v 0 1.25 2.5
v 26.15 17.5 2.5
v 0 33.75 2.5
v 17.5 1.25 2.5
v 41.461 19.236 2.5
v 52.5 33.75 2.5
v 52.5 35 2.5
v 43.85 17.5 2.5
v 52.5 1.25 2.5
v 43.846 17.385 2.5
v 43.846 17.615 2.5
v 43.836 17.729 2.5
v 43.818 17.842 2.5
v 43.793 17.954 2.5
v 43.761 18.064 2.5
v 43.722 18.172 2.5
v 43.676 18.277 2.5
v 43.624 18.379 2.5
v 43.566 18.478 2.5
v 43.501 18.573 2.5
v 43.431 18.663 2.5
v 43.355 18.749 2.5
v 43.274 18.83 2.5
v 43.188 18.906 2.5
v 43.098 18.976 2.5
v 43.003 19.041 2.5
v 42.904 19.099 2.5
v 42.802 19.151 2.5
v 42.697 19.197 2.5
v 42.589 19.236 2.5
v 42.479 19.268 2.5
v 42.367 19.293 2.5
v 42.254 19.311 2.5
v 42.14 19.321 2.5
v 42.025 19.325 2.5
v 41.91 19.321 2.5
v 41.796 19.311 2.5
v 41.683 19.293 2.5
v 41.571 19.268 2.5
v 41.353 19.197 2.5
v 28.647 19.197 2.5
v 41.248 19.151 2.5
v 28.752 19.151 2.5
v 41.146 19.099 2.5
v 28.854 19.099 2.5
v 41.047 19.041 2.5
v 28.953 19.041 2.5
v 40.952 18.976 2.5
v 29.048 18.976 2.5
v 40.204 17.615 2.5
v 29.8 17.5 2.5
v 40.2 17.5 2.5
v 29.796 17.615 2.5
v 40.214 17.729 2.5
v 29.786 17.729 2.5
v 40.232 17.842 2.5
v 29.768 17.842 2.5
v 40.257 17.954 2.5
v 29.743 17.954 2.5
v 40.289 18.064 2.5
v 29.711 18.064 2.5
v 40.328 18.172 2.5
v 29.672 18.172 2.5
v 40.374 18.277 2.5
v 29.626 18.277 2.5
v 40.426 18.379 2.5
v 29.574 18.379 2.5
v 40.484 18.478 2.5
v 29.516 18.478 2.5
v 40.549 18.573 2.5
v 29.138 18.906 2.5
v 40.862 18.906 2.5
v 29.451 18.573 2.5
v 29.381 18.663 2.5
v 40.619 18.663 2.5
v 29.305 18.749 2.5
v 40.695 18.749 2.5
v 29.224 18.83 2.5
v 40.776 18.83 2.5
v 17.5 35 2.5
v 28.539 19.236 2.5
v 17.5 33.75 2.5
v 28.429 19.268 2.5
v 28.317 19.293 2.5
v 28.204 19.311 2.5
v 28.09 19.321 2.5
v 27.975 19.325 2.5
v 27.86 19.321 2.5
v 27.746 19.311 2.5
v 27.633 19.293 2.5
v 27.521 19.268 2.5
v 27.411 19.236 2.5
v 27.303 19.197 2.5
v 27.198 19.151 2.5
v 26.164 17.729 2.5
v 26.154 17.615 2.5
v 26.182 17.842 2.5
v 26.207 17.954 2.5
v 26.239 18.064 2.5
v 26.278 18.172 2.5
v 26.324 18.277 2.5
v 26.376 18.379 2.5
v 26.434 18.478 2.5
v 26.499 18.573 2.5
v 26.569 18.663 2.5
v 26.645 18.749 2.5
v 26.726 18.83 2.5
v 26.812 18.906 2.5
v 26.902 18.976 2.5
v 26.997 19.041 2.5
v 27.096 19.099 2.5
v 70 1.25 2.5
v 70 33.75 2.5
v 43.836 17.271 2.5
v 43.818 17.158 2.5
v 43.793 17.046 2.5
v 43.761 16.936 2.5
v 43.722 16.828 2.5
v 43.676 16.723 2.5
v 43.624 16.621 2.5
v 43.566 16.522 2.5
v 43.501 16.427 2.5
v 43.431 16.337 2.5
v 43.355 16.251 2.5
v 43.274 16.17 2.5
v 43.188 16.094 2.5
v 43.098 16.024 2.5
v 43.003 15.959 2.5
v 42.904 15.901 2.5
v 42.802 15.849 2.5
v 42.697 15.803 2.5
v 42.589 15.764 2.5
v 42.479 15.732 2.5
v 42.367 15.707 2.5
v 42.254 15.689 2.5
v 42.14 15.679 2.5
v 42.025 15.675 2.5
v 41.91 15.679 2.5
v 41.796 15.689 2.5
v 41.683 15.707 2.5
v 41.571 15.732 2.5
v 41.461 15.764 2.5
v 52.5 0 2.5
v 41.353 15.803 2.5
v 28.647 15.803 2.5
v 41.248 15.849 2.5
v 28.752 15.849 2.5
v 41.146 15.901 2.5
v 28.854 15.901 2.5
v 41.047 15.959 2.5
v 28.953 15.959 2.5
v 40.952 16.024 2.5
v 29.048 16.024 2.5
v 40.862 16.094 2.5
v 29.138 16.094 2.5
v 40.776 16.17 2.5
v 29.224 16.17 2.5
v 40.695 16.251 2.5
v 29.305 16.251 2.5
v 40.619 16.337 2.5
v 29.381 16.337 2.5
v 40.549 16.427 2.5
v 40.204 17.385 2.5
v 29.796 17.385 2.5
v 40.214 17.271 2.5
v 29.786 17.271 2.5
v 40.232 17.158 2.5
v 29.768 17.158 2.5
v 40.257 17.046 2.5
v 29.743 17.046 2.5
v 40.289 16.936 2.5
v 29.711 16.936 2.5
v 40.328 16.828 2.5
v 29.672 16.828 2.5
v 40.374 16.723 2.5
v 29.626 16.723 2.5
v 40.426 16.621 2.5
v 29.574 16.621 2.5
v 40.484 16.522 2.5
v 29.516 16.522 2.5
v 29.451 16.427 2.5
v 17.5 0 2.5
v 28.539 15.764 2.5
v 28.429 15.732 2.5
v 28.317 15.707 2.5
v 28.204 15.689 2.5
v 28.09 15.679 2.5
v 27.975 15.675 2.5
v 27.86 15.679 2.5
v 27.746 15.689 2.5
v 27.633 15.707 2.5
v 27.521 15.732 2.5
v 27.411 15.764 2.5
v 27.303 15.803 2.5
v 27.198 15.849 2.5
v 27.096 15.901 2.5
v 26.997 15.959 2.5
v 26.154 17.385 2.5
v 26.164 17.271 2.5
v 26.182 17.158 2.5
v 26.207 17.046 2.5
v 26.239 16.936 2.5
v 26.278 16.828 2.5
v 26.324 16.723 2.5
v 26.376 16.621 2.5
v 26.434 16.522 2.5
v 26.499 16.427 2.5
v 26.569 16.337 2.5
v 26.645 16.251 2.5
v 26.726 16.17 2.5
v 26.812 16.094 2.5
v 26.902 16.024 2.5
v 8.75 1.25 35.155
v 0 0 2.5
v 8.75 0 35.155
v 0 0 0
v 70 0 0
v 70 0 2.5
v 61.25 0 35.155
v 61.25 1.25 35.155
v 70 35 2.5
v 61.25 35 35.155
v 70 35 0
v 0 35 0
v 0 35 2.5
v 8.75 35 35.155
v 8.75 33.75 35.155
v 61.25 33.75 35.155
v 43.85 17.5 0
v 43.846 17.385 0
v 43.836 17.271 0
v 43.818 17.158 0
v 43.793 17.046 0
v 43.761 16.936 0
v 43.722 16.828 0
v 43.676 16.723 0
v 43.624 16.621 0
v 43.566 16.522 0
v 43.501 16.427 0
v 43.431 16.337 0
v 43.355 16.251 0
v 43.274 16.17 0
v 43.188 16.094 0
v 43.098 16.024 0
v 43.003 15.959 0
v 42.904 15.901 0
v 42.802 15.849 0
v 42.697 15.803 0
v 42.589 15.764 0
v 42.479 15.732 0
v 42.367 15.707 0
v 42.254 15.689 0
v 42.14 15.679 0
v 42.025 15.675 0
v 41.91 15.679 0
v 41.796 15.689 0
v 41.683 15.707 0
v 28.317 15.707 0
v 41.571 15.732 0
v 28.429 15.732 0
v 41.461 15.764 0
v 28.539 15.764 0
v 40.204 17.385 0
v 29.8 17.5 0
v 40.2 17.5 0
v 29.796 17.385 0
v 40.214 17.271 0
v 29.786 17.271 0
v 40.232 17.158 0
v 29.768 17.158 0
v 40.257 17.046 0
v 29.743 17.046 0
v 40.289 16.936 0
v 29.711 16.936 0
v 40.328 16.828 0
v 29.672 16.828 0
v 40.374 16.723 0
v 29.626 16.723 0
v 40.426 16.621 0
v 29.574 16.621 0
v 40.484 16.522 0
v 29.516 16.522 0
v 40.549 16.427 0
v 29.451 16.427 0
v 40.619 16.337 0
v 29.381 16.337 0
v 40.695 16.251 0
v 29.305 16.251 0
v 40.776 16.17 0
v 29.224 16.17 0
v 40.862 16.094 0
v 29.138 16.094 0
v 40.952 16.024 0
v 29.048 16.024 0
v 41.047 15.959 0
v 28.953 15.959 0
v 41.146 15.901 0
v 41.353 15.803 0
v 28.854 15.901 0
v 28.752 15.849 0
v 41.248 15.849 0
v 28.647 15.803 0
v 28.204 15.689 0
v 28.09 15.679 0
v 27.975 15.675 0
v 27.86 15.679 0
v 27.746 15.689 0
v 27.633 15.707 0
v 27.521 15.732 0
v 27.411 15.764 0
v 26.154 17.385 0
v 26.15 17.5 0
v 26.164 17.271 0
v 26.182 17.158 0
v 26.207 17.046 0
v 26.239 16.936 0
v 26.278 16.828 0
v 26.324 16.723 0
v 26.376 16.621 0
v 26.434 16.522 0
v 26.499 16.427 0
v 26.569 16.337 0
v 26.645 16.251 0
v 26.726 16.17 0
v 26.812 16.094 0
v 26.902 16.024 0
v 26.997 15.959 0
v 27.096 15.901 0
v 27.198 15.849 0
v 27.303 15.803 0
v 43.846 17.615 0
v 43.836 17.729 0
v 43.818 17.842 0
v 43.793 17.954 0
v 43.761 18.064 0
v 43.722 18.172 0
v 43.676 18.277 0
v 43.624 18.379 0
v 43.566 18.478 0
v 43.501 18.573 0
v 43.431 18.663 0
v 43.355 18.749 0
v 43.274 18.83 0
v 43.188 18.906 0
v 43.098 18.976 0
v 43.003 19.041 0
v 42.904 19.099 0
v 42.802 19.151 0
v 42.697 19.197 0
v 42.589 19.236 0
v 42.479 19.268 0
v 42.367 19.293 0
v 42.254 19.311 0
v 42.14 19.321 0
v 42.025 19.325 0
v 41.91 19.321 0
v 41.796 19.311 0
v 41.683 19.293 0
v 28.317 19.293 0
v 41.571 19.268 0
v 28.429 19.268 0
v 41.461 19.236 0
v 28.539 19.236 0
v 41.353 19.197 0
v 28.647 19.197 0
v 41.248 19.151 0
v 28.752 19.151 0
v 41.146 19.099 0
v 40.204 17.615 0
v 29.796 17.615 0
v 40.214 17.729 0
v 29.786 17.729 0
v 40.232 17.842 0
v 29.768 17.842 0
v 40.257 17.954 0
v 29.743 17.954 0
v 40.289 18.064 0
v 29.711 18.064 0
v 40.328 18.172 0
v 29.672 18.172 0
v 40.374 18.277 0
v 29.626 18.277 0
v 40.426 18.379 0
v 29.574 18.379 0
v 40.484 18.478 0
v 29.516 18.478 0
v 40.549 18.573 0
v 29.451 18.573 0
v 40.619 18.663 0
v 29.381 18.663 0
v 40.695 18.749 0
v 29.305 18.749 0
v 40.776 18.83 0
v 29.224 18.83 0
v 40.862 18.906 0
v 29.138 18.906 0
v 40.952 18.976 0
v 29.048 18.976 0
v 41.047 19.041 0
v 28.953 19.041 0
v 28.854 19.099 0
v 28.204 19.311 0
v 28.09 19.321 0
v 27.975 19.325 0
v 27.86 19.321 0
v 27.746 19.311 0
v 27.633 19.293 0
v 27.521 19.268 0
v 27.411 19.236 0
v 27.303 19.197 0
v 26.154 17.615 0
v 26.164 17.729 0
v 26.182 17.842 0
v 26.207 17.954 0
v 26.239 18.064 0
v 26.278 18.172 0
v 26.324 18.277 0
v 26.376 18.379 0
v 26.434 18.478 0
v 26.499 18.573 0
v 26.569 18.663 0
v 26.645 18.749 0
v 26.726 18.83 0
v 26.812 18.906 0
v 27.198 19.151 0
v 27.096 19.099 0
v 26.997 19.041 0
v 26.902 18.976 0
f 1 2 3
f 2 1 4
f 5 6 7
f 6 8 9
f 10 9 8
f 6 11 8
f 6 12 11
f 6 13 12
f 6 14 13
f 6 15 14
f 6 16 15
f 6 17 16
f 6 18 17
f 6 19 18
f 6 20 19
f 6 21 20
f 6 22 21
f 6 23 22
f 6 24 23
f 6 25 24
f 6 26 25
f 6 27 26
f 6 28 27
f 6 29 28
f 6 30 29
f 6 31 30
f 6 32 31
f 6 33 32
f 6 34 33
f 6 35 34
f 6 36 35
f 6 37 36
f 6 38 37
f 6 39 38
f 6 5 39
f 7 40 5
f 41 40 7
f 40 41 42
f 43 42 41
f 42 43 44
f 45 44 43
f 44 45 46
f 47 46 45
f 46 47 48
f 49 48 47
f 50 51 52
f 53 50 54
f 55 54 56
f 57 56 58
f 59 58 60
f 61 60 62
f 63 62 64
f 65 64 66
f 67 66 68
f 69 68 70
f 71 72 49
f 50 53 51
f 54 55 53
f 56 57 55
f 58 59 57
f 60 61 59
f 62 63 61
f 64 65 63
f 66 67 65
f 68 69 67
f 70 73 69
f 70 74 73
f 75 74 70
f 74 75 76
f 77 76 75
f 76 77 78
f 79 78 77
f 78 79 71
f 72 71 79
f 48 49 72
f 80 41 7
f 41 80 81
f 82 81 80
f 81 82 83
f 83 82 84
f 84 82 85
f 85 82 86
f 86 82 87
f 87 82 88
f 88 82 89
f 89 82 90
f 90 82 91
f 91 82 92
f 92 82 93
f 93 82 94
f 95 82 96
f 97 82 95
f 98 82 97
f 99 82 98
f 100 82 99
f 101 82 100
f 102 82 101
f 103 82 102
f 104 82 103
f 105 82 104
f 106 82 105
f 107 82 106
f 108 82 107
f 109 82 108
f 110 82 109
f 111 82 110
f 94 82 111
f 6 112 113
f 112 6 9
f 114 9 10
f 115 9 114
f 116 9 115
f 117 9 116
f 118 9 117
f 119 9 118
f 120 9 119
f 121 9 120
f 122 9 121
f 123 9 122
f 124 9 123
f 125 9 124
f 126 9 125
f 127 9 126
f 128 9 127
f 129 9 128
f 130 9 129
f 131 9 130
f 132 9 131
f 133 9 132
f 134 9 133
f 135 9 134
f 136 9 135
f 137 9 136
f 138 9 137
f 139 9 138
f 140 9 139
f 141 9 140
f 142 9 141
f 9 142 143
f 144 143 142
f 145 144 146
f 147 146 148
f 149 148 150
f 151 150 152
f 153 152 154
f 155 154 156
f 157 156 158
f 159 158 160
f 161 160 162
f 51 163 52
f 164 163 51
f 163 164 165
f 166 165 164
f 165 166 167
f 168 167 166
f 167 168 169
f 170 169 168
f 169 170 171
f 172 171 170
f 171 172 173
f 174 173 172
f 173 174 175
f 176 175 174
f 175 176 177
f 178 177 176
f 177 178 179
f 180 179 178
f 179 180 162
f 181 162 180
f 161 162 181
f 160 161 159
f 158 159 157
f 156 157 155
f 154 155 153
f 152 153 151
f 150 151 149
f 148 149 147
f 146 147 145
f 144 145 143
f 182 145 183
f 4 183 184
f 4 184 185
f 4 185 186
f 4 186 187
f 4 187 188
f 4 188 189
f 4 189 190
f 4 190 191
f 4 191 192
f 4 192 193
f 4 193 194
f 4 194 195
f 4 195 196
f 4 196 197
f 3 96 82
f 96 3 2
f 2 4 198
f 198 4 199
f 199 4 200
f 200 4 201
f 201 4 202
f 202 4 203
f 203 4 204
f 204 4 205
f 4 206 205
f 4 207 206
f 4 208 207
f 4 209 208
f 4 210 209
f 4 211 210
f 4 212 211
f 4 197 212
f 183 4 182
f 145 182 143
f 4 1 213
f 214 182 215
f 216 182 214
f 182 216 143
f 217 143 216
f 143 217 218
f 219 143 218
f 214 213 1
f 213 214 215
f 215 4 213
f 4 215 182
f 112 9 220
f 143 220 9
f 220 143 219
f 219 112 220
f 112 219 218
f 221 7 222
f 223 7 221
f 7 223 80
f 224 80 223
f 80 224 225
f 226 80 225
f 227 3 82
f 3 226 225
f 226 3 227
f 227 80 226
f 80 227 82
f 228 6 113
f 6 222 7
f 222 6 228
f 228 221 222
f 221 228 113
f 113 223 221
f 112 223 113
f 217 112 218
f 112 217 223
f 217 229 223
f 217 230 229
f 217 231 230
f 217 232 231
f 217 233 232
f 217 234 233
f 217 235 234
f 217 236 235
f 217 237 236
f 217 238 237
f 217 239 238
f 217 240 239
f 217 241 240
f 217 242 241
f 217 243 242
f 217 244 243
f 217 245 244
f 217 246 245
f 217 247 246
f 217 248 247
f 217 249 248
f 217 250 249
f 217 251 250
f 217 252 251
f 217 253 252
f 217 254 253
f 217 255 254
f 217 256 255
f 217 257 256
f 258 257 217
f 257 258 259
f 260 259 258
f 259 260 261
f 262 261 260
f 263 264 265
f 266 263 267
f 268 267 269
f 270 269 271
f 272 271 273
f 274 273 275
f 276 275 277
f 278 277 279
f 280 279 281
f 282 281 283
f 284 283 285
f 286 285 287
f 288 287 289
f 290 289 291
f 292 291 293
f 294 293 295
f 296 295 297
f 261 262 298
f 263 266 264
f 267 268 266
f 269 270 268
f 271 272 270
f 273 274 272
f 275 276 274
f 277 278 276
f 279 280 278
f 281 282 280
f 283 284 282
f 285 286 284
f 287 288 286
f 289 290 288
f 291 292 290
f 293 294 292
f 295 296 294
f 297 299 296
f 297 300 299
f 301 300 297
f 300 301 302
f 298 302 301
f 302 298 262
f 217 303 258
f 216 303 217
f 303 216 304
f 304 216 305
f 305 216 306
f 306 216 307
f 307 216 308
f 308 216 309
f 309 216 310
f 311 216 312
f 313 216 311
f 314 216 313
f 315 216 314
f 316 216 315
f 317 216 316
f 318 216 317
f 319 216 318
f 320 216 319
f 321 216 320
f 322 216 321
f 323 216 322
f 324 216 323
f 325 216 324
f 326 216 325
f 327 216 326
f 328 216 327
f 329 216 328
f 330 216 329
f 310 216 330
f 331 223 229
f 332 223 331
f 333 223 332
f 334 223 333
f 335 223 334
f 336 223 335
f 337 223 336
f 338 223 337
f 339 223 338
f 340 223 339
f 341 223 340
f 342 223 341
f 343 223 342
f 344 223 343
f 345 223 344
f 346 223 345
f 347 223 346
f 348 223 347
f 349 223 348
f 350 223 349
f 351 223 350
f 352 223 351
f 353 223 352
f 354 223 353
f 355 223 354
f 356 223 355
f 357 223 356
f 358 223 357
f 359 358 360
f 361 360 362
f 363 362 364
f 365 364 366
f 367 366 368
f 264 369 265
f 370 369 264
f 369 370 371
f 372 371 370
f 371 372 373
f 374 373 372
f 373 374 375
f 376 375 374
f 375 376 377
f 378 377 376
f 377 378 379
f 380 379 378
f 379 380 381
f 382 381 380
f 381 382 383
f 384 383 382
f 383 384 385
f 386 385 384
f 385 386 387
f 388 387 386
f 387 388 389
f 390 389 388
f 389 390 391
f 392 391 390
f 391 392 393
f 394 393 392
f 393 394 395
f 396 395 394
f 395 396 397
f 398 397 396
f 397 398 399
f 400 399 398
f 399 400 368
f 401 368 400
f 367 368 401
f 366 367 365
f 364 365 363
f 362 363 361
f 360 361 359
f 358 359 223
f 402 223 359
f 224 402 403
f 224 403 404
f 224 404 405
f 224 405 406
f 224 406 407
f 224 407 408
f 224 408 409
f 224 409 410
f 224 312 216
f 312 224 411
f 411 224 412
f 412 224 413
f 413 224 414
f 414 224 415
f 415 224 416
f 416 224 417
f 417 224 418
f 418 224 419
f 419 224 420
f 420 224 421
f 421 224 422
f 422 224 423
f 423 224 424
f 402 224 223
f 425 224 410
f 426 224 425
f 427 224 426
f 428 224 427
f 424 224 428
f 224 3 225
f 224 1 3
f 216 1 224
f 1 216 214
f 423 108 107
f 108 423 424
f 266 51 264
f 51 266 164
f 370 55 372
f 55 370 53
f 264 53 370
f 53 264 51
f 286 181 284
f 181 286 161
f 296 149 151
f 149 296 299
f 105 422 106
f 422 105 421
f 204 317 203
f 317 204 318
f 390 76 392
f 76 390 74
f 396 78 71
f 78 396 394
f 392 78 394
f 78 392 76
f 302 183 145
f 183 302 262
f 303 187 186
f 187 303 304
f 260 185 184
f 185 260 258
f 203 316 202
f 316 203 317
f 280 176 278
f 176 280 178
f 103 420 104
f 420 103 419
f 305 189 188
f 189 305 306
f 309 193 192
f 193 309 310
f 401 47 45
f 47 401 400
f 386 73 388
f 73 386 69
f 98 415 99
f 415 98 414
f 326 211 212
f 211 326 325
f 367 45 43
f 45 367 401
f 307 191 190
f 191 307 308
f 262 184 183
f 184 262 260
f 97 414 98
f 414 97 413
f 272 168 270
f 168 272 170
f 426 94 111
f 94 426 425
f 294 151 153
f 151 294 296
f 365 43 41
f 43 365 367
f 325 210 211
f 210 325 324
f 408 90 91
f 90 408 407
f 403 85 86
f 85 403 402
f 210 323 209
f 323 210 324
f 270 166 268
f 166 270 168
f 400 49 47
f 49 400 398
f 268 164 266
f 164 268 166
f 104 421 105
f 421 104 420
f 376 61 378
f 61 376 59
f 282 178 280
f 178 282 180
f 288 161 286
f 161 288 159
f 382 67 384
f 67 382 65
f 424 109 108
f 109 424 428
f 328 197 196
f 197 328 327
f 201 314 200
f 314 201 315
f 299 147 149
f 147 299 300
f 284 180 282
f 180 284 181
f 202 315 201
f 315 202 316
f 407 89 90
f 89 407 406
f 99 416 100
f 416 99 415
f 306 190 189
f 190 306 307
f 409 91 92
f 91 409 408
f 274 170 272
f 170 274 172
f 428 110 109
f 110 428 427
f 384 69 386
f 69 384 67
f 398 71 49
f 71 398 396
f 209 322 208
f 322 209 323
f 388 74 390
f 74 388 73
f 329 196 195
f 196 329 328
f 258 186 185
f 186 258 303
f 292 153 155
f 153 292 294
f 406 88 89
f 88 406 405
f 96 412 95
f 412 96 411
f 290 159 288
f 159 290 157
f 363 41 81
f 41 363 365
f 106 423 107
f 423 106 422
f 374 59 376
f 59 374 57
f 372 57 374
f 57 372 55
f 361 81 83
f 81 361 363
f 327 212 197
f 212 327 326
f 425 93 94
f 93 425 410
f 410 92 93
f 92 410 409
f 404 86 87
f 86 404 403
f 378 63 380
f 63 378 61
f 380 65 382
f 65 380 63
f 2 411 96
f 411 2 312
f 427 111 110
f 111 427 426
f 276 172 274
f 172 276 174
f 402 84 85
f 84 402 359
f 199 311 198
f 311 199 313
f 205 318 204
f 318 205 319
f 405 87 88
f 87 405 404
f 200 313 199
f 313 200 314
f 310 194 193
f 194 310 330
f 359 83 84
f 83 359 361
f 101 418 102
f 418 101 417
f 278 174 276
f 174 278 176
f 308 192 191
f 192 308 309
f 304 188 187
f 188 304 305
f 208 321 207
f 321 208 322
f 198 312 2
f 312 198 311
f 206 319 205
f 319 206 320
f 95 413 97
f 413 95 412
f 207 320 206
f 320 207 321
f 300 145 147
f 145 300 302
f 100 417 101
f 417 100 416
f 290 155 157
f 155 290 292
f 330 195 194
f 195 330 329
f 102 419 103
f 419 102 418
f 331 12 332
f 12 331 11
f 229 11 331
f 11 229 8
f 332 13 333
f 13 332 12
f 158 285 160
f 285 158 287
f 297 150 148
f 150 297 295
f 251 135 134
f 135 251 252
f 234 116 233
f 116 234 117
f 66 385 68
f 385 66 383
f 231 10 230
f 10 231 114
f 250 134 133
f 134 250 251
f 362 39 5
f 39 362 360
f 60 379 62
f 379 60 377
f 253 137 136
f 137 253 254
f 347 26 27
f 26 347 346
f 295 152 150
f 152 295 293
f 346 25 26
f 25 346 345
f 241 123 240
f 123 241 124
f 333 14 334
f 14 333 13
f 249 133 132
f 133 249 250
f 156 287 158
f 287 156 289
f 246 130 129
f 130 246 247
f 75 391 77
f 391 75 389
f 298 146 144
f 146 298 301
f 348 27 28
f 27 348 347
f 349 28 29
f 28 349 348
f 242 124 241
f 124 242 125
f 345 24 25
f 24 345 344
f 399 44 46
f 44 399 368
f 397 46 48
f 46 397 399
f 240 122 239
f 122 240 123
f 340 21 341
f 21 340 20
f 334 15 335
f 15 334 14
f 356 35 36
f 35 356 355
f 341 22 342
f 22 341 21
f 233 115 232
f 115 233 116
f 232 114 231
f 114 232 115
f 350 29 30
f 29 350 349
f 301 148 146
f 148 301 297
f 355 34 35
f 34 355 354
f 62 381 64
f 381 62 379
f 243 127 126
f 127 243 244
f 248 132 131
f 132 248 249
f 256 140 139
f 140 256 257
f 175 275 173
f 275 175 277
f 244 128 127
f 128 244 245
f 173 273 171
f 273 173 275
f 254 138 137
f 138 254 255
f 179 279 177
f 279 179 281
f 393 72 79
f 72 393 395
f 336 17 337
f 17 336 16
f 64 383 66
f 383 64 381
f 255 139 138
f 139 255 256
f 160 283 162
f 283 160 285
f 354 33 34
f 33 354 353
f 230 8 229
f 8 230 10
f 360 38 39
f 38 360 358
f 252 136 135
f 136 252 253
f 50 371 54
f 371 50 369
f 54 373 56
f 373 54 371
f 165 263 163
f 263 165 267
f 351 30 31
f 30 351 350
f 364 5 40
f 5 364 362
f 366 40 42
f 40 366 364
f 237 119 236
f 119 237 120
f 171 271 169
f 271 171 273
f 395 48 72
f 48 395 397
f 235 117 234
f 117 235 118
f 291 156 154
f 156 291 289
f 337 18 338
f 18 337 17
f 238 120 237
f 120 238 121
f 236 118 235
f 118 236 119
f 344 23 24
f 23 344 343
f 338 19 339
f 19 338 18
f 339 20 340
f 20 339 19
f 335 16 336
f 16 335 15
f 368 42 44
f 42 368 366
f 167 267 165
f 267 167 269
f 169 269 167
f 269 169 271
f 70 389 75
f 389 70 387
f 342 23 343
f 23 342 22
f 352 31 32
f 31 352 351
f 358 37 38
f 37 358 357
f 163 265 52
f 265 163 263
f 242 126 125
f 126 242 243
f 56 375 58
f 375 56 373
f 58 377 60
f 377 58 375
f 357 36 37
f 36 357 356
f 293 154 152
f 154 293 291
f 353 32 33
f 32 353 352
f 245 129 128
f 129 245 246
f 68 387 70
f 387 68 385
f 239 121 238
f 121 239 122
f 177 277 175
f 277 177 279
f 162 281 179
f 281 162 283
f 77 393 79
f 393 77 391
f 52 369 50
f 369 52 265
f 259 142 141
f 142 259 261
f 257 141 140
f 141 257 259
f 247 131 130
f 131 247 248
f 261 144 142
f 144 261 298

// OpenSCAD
// Daniel Seijas Iglesias <seijasdeveloper@gmail.com>
// placa bombilla

$fn = 100;

largo = 70;
ancho = 35;
grosor = 2.5;

d_min = 10.4;
d_max = 17.6;
diametro_tornillo = 3.65;


difference(){
    union(){
        // base
        cube([largo, ancho, grosor]);
        
        
        // pincho a1
        translate([0, 0, grosor])
            pincho();
        
        // pincho a2
        translate([largo-ancho/2, 0, grosor])
            pincho();
        
        // pincho b1
        translate([0, ancho-grosor/2, grosor])
            pincho();
        
        // pincho b2
        translate([largo-ancho/2, ancho-grosor/2, grosor])
            pincho();
    }
    
    // resta tornillo 1
    translate([largo/2-d_min/2-diametro_tornillo/2, ancho/2, -0.05])
        cylinder(d=diametro_tornillo, h=grosor+0.1);
    
    // resta tornillo 2
    translate([largo/2+d_min/2+diametro_tornillo/2, ancho/2, -0.05])
        cylinder(d=diametro_tornillo, h=grosor+0.1);
    
}

module pincho(){
    difference(){
        cube([ancho/2, grosor/2, ancho]);
        
        
        translate([0, grosor/2+0.05, 0])
            rotate([0, -15, 180])
                cube([ancho/2, grosor/2+0.1, ancho+5]);
        
        translate([ancho/2, -0.05, 0])
            rotate([0, 0, 180])
            rotate([0, -15, 180])
                cube([ancho/2, grosor/2+0.1, ancho+5]);
    }
}
